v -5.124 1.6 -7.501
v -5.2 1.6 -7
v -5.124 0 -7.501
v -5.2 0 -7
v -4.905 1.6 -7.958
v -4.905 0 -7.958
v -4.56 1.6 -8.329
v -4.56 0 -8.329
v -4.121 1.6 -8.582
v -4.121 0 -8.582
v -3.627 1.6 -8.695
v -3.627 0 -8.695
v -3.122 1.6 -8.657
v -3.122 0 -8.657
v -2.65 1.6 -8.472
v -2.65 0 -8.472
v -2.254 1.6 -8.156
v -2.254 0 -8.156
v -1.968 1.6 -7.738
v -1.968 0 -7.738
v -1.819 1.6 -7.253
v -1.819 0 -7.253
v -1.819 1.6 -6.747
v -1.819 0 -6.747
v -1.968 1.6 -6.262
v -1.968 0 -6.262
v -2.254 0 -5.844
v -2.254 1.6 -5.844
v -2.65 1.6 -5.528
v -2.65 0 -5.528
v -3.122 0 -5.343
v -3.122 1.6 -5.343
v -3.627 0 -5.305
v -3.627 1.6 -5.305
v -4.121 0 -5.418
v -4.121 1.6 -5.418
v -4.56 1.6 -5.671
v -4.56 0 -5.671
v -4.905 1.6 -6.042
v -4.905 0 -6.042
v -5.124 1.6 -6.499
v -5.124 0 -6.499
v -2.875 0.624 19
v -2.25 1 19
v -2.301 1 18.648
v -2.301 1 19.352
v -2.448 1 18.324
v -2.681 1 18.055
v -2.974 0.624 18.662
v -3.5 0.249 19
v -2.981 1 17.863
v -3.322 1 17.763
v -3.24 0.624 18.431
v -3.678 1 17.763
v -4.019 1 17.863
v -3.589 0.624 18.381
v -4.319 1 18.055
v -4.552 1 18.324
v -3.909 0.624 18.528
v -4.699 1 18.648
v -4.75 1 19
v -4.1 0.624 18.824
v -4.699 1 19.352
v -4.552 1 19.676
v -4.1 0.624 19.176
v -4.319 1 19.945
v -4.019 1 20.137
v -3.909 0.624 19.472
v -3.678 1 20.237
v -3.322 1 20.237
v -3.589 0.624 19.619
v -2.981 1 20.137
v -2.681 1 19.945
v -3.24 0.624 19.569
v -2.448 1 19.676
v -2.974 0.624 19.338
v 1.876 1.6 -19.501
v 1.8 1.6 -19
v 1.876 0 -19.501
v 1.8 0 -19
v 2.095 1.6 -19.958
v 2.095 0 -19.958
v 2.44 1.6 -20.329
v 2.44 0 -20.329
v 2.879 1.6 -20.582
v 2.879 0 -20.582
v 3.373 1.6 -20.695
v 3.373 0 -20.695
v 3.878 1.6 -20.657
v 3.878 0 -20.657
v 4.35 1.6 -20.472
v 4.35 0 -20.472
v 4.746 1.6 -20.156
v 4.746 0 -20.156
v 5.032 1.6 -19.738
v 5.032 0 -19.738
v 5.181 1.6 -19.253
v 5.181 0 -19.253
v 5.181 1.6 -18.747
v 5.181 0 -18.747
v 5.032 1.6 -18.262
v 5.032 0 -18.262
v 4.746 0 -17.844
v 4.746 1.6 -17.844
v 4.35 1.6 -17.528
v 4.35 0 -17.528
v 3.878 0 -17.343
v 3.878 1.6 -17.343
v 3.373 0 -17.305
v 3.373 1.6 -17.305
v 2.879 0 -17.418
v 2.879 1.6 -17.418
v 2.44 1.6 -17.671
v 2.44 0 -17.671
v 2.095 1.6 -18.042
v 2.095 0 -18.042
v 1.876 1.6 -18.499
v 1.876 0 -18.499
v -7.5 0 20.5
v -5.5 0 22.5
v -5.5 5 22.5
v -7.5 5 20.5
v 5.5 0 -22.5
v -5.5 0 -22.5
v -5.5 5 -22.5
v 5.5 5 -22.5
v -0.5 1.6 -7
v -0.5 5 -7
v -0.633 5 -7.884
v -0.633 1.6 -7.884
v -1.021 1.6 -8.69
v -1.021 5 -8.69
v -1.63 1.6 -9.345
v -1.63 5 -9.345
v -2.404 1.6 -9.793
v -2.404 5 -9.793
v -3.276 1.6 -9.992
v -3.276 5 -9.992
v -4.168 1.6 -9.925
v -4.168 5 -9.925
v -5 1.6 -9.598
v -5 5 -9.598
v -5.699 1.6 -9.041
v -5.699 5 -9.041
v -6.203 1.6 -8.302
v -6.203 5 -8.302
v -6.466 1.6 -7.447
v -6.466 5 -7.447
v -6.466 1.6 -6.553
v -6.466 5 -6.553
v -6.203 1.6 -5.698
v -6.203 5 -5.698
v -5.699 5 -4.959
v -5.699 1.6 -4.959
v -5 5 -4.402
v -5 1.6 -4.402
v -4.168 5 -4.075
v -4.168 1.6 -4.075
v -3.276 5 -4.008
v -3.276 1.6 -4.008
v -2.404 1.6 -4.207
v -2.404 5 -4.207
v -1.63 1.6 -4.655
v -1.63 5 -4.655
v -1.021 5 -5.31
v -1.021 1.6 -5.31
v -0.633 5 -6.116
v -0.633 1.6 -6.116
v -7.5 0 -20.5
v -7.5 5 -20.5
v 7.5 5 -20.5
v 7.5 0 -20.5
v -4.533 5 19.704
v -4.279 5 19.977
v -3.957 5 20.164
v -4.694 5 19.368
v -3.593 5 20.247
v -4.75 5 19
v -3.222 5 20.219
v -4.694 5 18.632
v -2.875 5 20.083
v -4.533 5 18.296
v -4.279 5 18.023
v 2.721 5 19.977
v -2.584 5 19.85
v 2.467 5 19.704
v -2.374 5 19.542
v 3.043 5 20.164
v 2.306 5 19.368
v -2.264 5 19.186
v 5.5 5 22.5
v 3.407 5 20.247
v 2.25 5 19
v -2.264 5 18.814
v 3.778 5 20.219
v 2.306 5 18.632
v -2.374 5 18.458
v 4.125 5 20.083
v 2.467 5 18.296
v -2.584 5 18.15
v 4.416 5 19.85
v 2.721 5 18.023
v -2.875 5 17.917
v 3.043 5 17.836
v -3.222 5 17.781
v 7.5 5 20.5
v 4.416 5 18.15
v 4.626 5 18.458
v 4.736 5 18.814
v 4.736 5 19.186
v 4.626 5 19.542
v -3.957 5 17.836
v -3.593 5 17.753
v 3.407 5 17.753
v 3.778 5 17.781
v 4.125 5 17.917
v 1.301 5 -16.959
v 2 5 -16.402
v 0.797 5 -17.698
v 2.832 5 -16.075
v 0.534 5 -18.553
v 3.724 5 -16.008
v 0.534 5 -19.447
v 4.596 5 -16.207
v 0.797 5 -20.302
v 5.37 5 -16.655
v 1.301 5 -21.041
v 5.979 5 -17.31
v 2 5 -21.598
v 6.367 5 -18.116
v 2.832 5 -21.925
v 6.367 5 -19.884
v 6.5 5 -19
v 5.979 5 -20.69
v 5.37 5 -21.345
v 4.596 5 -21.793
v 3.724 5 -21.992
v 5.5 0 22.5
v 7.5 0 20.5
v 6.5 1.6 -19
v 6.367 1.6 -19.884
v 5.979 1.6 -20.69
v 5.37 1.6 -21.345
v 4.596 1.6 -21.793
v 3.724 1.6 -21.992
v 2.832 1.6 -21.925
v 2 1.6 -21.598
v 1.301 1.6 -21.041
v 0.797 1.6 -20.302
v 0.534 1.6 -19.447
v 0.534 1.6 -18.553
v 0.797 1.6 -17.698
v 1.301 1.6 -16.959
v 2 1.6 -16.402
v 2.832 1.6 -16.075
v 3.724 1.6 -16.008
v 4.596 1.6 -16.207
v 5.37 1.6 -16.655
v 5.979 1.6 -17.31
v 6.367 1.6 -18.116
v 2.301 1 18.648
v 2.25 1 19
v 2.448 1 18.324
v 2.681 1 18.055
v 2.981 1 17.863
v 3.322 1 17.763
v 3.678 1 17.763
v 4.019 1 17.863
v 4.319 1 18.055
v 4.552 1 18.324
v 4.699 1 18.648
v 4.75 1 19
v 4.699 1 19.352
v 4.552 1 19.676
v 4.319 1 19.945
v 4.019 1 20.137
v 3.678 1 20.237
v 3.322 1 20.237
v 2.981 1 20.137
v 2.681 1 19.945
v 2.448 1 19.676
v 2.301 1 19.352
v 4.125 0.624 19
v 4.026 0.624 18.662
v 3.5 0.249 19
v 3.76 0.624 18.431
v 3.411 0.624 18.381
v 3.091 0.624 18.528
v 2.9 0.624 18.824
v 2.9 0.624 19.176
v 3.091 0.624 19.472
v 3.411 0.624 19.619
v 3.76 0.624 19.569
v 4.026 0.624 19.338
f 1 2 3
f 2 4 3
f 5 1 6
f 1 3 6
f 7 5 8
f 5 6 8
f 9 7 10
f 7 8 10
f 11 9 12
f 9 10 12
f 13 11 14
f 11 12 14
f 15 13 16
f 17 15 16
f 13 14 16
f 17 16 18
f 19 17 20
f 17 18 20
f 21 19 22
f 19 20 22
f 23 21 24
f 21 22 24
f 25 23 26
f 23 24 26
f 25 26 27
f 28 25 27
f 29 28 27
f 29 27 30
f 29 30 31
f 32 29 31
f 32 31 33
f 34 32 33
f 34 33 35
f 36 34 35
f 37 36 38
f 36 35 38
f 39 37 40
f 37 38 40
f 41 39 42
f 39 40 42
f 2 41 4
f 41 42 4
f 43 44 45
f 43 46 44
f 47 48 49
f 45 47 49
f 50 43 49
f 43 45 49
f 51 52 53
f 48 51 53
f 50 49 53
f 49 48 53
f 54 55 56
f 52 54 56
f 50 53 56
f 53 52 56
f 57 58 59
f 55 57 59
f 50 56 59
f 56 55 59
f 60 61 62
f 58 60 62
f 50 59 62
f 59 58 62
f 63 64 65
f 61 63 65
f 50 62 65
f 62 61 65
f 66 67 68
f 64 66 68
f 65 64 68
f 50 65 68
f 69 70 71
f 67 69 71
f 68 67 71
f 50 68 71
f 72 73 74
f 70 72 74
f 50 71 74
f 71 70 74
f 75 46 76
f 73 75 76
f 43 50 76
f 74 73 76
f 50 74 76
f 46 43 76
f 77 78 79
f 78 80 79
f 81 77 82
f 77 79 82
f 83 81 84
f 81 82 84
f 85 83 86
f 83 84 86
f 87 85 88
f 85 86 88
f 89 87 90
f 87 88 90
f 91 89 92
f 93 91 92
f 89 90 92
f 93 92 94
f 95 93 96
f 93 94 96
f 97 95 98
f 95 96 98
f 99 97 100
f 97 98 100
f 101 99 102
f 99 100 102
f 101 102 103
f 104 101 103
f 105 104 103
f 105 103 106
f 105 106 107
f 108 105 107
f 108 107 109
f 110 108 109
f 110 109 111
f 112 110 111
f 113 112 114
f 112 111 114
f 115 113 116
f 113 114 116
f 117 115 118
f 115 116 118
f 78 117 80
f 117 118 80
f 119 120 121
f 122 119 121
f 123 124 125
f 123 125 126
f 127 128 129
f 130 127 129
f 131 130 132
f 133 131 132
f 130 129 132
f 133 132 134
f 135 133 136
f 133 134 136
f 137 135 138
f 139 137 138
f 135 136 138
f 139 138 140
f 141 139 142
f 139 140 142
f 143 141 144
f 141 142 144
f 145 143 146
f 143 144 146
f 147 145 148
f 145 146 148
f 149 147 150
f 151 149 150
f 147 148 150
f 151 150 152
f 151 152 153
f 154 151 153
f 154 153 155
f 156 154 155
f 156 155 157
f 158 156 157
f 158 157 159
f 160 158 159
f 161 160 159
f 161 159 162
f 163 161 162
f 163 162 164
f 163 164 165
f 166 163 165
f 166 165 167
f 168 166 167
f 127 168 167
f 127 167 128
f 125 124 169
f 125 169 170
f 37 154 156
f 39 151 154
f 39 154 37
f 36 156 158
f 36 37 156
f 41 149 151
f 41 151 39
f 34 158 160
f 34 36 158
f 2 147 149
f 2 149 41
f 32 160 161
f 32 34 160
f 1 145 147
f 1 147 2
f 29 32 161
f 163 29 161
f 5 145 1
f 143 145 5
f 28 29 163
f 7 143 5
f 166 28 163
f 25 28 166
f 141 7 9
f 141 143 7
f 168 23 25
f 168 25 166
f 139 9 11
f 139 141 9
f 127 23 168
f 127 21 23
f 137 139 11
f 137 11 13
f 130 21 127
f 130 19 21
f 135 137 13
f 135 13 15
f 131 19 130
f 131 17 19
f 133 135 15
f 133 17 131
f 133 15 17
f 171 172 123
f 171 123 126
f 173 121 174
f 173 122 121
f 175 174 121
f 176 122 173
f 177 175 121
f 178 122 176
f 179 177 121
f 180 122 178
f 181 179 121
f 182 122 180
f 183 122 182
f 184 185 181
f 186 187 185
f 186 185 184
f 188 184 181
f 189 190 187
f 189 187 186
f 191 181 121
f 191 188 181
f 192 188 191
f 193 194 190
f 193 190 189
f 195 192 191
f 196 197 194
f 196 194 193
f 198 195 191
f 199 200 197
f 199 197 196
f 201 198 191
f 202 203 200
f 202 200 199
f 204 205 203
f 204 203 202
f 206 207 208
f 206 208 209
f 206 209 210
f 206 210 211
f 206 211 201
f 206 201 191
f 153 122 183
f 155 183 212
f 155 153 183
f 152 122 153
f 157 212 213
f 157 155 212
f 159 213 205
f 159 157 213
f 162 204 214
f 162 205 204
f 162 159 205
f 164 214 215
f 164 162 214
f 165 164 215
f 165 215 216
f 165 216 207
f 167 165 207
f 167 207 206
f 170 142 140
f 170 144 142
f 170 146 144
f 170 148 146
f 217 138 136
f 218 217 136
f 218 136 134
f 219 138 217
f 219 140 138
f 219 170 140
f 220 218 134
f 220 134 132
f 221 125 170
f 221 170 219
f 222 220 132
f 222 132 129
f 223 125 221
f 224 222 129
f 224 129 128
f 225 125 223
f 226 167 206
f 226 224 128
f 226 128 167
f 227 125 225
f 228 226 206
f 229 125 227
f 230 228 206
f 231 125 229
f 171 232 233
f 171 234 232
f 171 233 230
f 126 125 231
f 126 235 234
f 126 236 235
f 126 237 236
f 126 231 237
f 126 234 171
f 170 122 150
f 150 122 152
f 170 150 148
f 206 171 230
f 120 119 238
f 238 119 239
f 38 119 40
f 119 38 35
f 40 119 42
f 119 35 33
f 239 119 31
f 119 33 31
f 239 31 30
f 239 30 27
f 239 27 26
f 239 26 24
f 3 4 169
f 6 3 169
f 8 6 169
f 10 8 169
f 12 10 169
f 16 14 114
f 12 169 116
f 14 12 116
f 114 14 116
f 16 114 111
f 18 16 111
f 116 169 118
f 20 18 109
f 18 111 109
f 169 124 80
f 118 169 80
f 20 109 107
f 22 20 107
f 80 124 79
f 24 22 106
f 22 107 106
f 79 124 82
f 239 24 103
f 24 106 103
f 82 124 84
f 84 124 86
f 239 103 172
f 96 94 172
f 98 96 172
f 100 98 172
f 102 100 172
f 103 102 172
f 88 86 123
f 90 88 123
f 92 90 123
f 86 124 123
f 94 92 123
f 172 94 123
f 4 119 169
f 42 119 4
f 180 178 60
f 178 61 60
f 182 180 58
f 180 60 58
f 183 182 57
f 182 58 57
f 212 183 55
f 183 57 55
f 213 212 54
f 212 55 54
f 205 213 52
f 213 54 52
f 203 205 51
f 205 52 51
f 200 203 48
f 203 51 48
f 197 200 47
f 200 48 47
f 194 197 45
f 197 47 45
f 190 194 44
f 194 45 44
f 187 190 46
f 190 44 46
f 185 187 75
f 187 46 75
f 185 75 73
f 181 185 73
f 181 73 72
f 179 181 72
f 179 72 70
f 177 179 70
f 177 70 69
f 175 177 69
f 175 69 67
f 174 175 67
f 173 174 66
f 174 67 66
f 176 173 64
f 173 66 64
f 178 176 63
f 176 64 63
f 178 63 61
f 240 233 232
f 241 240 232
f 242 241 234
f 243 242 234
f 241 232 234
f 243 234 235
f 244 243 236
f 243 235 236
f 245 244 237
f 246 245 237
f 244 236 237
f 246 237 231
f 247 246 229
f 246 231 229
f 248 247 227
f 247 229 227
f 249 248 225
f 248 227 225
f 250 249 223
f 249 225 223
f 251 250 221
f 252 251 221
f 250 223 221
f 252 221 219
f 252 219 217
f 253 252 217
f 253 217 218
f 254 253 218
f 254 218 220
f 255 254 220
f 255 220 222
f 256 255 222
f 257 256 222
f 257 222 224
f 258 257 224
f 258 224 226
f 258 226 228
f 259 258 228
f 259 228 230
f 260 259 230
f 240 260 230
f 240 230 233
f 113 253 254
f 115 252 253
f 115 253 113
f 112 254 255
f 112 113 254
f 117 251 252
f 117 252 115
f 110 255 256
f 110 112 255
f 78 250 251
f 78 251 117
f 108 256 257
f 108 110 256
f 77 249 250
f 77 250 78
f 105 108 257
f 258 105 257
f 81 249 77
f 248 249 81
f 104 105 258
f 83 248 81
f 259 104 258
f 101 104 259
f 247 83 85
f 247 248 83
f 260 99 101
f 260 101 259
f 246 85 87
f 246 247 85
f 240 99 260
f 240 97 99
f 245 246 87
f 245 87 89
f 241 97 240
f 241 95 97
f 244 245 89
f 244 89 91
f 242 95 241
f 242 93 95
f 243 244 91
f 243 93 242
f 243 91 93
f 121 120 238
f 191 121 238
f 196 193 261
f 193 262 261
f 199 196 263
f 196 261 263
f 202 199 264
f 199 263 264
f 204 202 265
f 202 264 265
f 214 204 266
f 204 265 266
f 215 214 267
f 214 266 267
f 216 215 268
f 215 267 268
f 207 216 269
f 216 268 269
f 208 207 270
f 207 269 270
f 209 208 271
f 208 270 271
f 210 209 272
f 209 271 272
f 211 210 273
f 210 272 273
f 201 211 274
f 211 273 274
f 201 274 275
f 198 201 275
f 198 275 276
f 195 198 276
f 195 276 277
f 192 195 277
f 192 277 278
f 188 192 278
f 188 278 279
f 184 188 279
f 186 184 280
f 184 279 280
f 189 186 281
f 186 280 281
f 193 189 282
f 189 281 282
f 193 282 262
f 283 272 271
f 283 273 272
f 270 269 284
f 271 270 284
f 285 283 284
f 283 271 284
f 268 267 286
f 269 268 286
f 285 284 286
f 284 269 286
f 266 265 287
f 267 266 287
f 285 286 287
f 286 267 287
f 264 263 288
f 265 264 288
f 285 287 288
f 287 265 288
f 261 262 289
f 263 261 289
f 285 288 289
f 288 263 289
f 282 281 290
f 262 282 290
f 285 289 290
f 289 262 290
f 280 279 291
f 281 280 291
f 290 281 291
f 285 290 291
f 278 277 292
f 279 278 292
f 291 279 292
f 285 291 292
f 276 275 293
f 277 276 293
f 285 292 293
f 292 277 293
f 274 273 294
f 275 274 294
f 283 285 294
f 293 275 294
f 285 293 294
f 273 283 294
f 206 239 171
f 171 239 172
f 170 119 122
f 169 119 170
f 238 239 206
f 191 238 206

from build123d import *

# Parameters (mm, degrees)
SKETCH1_W                                            = 15
SKETCH1_H                                            = 45
BOSS_EXTRUDE1_DEPTH                                  = 5
M3_TAPPED_HOLE1_D                                    = 2.5
M3_TAPPED_HOLE1_DEPTH                                = 4
M3_TAPPED_HOLE1_TIP                                  = 0.751075774
CBORE_FOR_M3_HEXAGON_SOCKET_HEAD_CAP_SCR_D           = 3.4
CBORE_FOR_M3_HEXAGON_SOCKET_HEAD_CAP_SCR_CBORE_D     = 6
CBORE_FOR_M3_HEXAGON_SOCKET_HEAD_CAP_SCR_CBORE_DEPTH = 3.4
CHAMFER1_SIZE                                        = 2


with BuildPart() as part:
    # Sketch1 → Boss-Extrude1 (new body)
    with BuildSketch(Plane(origin=(0, 0, 0), x_dir=(1, 0, 0), z_dir=(0, 1, 0))):
        Rectangle(SKETCH1_W, SKETCH1_H)
    extrude(amount=BOSS_EXTRUDE1_DEPTH)

    # M3 Tapped Hole1
    with Locations(Plane(origin=(0, 5, 0), x_dir=(1, 0, 0), z_dir=(0, 1, 0))):
        with Locations((-3.5, -19), (3.5, -19)):
            Hole(M3_TAPPED_HOLE1_D / 2, depth=M3_TAPPED_HOLE1_DEPTH)
            with Locations((0, 0, -(M3_TAPPED_HOLE1_DEPTH + M3_TAPPED_HOLE1_TIP / 2))):  # 118° drill point
                Cone(0, M3_TAPPED_HOLE1_D / 2, M3_TAPPED_HOLE1_TIP, mode=Mode.SUBTRACT)

    # CBORE for M3 Hexagon socket head cap screws1 (through all)
    with Locations(Plane(origin=(0, 5, 0), x_dir=(1, 0, 0), z_dir=(0, 1, 0))):
        with Locations((3.5, 19), (-3.5, 7)):
            CounterBoreHole(CBORE_FOR_M3_HEXAGON_SOCKET_HEAD_CAP_SCR_D / 2, CBORE_FOR_M3_HEXAGON_SOCKET_HEAD_CAP_SCR_CBORE_D / 2, CBORE_FOR_M3_HEXAGON_SOCKET_HEAD_CAP_SCR_CBORE_DEPTH)

    # Chamfer1
    chamfer1_edges = [part.edges().sort_by_distance(p)[0] for p in [
        (7.5, 2.5, 22.5),
        (-7.5, 2.5, 22.5),
        (-7.5, 2.5, -22.5),
        (7.5, 2.5, -22.5),
    ]]
    chamfer(chamfer1_edges, length=CHAMFER1_SIZE)


solid = part.part
